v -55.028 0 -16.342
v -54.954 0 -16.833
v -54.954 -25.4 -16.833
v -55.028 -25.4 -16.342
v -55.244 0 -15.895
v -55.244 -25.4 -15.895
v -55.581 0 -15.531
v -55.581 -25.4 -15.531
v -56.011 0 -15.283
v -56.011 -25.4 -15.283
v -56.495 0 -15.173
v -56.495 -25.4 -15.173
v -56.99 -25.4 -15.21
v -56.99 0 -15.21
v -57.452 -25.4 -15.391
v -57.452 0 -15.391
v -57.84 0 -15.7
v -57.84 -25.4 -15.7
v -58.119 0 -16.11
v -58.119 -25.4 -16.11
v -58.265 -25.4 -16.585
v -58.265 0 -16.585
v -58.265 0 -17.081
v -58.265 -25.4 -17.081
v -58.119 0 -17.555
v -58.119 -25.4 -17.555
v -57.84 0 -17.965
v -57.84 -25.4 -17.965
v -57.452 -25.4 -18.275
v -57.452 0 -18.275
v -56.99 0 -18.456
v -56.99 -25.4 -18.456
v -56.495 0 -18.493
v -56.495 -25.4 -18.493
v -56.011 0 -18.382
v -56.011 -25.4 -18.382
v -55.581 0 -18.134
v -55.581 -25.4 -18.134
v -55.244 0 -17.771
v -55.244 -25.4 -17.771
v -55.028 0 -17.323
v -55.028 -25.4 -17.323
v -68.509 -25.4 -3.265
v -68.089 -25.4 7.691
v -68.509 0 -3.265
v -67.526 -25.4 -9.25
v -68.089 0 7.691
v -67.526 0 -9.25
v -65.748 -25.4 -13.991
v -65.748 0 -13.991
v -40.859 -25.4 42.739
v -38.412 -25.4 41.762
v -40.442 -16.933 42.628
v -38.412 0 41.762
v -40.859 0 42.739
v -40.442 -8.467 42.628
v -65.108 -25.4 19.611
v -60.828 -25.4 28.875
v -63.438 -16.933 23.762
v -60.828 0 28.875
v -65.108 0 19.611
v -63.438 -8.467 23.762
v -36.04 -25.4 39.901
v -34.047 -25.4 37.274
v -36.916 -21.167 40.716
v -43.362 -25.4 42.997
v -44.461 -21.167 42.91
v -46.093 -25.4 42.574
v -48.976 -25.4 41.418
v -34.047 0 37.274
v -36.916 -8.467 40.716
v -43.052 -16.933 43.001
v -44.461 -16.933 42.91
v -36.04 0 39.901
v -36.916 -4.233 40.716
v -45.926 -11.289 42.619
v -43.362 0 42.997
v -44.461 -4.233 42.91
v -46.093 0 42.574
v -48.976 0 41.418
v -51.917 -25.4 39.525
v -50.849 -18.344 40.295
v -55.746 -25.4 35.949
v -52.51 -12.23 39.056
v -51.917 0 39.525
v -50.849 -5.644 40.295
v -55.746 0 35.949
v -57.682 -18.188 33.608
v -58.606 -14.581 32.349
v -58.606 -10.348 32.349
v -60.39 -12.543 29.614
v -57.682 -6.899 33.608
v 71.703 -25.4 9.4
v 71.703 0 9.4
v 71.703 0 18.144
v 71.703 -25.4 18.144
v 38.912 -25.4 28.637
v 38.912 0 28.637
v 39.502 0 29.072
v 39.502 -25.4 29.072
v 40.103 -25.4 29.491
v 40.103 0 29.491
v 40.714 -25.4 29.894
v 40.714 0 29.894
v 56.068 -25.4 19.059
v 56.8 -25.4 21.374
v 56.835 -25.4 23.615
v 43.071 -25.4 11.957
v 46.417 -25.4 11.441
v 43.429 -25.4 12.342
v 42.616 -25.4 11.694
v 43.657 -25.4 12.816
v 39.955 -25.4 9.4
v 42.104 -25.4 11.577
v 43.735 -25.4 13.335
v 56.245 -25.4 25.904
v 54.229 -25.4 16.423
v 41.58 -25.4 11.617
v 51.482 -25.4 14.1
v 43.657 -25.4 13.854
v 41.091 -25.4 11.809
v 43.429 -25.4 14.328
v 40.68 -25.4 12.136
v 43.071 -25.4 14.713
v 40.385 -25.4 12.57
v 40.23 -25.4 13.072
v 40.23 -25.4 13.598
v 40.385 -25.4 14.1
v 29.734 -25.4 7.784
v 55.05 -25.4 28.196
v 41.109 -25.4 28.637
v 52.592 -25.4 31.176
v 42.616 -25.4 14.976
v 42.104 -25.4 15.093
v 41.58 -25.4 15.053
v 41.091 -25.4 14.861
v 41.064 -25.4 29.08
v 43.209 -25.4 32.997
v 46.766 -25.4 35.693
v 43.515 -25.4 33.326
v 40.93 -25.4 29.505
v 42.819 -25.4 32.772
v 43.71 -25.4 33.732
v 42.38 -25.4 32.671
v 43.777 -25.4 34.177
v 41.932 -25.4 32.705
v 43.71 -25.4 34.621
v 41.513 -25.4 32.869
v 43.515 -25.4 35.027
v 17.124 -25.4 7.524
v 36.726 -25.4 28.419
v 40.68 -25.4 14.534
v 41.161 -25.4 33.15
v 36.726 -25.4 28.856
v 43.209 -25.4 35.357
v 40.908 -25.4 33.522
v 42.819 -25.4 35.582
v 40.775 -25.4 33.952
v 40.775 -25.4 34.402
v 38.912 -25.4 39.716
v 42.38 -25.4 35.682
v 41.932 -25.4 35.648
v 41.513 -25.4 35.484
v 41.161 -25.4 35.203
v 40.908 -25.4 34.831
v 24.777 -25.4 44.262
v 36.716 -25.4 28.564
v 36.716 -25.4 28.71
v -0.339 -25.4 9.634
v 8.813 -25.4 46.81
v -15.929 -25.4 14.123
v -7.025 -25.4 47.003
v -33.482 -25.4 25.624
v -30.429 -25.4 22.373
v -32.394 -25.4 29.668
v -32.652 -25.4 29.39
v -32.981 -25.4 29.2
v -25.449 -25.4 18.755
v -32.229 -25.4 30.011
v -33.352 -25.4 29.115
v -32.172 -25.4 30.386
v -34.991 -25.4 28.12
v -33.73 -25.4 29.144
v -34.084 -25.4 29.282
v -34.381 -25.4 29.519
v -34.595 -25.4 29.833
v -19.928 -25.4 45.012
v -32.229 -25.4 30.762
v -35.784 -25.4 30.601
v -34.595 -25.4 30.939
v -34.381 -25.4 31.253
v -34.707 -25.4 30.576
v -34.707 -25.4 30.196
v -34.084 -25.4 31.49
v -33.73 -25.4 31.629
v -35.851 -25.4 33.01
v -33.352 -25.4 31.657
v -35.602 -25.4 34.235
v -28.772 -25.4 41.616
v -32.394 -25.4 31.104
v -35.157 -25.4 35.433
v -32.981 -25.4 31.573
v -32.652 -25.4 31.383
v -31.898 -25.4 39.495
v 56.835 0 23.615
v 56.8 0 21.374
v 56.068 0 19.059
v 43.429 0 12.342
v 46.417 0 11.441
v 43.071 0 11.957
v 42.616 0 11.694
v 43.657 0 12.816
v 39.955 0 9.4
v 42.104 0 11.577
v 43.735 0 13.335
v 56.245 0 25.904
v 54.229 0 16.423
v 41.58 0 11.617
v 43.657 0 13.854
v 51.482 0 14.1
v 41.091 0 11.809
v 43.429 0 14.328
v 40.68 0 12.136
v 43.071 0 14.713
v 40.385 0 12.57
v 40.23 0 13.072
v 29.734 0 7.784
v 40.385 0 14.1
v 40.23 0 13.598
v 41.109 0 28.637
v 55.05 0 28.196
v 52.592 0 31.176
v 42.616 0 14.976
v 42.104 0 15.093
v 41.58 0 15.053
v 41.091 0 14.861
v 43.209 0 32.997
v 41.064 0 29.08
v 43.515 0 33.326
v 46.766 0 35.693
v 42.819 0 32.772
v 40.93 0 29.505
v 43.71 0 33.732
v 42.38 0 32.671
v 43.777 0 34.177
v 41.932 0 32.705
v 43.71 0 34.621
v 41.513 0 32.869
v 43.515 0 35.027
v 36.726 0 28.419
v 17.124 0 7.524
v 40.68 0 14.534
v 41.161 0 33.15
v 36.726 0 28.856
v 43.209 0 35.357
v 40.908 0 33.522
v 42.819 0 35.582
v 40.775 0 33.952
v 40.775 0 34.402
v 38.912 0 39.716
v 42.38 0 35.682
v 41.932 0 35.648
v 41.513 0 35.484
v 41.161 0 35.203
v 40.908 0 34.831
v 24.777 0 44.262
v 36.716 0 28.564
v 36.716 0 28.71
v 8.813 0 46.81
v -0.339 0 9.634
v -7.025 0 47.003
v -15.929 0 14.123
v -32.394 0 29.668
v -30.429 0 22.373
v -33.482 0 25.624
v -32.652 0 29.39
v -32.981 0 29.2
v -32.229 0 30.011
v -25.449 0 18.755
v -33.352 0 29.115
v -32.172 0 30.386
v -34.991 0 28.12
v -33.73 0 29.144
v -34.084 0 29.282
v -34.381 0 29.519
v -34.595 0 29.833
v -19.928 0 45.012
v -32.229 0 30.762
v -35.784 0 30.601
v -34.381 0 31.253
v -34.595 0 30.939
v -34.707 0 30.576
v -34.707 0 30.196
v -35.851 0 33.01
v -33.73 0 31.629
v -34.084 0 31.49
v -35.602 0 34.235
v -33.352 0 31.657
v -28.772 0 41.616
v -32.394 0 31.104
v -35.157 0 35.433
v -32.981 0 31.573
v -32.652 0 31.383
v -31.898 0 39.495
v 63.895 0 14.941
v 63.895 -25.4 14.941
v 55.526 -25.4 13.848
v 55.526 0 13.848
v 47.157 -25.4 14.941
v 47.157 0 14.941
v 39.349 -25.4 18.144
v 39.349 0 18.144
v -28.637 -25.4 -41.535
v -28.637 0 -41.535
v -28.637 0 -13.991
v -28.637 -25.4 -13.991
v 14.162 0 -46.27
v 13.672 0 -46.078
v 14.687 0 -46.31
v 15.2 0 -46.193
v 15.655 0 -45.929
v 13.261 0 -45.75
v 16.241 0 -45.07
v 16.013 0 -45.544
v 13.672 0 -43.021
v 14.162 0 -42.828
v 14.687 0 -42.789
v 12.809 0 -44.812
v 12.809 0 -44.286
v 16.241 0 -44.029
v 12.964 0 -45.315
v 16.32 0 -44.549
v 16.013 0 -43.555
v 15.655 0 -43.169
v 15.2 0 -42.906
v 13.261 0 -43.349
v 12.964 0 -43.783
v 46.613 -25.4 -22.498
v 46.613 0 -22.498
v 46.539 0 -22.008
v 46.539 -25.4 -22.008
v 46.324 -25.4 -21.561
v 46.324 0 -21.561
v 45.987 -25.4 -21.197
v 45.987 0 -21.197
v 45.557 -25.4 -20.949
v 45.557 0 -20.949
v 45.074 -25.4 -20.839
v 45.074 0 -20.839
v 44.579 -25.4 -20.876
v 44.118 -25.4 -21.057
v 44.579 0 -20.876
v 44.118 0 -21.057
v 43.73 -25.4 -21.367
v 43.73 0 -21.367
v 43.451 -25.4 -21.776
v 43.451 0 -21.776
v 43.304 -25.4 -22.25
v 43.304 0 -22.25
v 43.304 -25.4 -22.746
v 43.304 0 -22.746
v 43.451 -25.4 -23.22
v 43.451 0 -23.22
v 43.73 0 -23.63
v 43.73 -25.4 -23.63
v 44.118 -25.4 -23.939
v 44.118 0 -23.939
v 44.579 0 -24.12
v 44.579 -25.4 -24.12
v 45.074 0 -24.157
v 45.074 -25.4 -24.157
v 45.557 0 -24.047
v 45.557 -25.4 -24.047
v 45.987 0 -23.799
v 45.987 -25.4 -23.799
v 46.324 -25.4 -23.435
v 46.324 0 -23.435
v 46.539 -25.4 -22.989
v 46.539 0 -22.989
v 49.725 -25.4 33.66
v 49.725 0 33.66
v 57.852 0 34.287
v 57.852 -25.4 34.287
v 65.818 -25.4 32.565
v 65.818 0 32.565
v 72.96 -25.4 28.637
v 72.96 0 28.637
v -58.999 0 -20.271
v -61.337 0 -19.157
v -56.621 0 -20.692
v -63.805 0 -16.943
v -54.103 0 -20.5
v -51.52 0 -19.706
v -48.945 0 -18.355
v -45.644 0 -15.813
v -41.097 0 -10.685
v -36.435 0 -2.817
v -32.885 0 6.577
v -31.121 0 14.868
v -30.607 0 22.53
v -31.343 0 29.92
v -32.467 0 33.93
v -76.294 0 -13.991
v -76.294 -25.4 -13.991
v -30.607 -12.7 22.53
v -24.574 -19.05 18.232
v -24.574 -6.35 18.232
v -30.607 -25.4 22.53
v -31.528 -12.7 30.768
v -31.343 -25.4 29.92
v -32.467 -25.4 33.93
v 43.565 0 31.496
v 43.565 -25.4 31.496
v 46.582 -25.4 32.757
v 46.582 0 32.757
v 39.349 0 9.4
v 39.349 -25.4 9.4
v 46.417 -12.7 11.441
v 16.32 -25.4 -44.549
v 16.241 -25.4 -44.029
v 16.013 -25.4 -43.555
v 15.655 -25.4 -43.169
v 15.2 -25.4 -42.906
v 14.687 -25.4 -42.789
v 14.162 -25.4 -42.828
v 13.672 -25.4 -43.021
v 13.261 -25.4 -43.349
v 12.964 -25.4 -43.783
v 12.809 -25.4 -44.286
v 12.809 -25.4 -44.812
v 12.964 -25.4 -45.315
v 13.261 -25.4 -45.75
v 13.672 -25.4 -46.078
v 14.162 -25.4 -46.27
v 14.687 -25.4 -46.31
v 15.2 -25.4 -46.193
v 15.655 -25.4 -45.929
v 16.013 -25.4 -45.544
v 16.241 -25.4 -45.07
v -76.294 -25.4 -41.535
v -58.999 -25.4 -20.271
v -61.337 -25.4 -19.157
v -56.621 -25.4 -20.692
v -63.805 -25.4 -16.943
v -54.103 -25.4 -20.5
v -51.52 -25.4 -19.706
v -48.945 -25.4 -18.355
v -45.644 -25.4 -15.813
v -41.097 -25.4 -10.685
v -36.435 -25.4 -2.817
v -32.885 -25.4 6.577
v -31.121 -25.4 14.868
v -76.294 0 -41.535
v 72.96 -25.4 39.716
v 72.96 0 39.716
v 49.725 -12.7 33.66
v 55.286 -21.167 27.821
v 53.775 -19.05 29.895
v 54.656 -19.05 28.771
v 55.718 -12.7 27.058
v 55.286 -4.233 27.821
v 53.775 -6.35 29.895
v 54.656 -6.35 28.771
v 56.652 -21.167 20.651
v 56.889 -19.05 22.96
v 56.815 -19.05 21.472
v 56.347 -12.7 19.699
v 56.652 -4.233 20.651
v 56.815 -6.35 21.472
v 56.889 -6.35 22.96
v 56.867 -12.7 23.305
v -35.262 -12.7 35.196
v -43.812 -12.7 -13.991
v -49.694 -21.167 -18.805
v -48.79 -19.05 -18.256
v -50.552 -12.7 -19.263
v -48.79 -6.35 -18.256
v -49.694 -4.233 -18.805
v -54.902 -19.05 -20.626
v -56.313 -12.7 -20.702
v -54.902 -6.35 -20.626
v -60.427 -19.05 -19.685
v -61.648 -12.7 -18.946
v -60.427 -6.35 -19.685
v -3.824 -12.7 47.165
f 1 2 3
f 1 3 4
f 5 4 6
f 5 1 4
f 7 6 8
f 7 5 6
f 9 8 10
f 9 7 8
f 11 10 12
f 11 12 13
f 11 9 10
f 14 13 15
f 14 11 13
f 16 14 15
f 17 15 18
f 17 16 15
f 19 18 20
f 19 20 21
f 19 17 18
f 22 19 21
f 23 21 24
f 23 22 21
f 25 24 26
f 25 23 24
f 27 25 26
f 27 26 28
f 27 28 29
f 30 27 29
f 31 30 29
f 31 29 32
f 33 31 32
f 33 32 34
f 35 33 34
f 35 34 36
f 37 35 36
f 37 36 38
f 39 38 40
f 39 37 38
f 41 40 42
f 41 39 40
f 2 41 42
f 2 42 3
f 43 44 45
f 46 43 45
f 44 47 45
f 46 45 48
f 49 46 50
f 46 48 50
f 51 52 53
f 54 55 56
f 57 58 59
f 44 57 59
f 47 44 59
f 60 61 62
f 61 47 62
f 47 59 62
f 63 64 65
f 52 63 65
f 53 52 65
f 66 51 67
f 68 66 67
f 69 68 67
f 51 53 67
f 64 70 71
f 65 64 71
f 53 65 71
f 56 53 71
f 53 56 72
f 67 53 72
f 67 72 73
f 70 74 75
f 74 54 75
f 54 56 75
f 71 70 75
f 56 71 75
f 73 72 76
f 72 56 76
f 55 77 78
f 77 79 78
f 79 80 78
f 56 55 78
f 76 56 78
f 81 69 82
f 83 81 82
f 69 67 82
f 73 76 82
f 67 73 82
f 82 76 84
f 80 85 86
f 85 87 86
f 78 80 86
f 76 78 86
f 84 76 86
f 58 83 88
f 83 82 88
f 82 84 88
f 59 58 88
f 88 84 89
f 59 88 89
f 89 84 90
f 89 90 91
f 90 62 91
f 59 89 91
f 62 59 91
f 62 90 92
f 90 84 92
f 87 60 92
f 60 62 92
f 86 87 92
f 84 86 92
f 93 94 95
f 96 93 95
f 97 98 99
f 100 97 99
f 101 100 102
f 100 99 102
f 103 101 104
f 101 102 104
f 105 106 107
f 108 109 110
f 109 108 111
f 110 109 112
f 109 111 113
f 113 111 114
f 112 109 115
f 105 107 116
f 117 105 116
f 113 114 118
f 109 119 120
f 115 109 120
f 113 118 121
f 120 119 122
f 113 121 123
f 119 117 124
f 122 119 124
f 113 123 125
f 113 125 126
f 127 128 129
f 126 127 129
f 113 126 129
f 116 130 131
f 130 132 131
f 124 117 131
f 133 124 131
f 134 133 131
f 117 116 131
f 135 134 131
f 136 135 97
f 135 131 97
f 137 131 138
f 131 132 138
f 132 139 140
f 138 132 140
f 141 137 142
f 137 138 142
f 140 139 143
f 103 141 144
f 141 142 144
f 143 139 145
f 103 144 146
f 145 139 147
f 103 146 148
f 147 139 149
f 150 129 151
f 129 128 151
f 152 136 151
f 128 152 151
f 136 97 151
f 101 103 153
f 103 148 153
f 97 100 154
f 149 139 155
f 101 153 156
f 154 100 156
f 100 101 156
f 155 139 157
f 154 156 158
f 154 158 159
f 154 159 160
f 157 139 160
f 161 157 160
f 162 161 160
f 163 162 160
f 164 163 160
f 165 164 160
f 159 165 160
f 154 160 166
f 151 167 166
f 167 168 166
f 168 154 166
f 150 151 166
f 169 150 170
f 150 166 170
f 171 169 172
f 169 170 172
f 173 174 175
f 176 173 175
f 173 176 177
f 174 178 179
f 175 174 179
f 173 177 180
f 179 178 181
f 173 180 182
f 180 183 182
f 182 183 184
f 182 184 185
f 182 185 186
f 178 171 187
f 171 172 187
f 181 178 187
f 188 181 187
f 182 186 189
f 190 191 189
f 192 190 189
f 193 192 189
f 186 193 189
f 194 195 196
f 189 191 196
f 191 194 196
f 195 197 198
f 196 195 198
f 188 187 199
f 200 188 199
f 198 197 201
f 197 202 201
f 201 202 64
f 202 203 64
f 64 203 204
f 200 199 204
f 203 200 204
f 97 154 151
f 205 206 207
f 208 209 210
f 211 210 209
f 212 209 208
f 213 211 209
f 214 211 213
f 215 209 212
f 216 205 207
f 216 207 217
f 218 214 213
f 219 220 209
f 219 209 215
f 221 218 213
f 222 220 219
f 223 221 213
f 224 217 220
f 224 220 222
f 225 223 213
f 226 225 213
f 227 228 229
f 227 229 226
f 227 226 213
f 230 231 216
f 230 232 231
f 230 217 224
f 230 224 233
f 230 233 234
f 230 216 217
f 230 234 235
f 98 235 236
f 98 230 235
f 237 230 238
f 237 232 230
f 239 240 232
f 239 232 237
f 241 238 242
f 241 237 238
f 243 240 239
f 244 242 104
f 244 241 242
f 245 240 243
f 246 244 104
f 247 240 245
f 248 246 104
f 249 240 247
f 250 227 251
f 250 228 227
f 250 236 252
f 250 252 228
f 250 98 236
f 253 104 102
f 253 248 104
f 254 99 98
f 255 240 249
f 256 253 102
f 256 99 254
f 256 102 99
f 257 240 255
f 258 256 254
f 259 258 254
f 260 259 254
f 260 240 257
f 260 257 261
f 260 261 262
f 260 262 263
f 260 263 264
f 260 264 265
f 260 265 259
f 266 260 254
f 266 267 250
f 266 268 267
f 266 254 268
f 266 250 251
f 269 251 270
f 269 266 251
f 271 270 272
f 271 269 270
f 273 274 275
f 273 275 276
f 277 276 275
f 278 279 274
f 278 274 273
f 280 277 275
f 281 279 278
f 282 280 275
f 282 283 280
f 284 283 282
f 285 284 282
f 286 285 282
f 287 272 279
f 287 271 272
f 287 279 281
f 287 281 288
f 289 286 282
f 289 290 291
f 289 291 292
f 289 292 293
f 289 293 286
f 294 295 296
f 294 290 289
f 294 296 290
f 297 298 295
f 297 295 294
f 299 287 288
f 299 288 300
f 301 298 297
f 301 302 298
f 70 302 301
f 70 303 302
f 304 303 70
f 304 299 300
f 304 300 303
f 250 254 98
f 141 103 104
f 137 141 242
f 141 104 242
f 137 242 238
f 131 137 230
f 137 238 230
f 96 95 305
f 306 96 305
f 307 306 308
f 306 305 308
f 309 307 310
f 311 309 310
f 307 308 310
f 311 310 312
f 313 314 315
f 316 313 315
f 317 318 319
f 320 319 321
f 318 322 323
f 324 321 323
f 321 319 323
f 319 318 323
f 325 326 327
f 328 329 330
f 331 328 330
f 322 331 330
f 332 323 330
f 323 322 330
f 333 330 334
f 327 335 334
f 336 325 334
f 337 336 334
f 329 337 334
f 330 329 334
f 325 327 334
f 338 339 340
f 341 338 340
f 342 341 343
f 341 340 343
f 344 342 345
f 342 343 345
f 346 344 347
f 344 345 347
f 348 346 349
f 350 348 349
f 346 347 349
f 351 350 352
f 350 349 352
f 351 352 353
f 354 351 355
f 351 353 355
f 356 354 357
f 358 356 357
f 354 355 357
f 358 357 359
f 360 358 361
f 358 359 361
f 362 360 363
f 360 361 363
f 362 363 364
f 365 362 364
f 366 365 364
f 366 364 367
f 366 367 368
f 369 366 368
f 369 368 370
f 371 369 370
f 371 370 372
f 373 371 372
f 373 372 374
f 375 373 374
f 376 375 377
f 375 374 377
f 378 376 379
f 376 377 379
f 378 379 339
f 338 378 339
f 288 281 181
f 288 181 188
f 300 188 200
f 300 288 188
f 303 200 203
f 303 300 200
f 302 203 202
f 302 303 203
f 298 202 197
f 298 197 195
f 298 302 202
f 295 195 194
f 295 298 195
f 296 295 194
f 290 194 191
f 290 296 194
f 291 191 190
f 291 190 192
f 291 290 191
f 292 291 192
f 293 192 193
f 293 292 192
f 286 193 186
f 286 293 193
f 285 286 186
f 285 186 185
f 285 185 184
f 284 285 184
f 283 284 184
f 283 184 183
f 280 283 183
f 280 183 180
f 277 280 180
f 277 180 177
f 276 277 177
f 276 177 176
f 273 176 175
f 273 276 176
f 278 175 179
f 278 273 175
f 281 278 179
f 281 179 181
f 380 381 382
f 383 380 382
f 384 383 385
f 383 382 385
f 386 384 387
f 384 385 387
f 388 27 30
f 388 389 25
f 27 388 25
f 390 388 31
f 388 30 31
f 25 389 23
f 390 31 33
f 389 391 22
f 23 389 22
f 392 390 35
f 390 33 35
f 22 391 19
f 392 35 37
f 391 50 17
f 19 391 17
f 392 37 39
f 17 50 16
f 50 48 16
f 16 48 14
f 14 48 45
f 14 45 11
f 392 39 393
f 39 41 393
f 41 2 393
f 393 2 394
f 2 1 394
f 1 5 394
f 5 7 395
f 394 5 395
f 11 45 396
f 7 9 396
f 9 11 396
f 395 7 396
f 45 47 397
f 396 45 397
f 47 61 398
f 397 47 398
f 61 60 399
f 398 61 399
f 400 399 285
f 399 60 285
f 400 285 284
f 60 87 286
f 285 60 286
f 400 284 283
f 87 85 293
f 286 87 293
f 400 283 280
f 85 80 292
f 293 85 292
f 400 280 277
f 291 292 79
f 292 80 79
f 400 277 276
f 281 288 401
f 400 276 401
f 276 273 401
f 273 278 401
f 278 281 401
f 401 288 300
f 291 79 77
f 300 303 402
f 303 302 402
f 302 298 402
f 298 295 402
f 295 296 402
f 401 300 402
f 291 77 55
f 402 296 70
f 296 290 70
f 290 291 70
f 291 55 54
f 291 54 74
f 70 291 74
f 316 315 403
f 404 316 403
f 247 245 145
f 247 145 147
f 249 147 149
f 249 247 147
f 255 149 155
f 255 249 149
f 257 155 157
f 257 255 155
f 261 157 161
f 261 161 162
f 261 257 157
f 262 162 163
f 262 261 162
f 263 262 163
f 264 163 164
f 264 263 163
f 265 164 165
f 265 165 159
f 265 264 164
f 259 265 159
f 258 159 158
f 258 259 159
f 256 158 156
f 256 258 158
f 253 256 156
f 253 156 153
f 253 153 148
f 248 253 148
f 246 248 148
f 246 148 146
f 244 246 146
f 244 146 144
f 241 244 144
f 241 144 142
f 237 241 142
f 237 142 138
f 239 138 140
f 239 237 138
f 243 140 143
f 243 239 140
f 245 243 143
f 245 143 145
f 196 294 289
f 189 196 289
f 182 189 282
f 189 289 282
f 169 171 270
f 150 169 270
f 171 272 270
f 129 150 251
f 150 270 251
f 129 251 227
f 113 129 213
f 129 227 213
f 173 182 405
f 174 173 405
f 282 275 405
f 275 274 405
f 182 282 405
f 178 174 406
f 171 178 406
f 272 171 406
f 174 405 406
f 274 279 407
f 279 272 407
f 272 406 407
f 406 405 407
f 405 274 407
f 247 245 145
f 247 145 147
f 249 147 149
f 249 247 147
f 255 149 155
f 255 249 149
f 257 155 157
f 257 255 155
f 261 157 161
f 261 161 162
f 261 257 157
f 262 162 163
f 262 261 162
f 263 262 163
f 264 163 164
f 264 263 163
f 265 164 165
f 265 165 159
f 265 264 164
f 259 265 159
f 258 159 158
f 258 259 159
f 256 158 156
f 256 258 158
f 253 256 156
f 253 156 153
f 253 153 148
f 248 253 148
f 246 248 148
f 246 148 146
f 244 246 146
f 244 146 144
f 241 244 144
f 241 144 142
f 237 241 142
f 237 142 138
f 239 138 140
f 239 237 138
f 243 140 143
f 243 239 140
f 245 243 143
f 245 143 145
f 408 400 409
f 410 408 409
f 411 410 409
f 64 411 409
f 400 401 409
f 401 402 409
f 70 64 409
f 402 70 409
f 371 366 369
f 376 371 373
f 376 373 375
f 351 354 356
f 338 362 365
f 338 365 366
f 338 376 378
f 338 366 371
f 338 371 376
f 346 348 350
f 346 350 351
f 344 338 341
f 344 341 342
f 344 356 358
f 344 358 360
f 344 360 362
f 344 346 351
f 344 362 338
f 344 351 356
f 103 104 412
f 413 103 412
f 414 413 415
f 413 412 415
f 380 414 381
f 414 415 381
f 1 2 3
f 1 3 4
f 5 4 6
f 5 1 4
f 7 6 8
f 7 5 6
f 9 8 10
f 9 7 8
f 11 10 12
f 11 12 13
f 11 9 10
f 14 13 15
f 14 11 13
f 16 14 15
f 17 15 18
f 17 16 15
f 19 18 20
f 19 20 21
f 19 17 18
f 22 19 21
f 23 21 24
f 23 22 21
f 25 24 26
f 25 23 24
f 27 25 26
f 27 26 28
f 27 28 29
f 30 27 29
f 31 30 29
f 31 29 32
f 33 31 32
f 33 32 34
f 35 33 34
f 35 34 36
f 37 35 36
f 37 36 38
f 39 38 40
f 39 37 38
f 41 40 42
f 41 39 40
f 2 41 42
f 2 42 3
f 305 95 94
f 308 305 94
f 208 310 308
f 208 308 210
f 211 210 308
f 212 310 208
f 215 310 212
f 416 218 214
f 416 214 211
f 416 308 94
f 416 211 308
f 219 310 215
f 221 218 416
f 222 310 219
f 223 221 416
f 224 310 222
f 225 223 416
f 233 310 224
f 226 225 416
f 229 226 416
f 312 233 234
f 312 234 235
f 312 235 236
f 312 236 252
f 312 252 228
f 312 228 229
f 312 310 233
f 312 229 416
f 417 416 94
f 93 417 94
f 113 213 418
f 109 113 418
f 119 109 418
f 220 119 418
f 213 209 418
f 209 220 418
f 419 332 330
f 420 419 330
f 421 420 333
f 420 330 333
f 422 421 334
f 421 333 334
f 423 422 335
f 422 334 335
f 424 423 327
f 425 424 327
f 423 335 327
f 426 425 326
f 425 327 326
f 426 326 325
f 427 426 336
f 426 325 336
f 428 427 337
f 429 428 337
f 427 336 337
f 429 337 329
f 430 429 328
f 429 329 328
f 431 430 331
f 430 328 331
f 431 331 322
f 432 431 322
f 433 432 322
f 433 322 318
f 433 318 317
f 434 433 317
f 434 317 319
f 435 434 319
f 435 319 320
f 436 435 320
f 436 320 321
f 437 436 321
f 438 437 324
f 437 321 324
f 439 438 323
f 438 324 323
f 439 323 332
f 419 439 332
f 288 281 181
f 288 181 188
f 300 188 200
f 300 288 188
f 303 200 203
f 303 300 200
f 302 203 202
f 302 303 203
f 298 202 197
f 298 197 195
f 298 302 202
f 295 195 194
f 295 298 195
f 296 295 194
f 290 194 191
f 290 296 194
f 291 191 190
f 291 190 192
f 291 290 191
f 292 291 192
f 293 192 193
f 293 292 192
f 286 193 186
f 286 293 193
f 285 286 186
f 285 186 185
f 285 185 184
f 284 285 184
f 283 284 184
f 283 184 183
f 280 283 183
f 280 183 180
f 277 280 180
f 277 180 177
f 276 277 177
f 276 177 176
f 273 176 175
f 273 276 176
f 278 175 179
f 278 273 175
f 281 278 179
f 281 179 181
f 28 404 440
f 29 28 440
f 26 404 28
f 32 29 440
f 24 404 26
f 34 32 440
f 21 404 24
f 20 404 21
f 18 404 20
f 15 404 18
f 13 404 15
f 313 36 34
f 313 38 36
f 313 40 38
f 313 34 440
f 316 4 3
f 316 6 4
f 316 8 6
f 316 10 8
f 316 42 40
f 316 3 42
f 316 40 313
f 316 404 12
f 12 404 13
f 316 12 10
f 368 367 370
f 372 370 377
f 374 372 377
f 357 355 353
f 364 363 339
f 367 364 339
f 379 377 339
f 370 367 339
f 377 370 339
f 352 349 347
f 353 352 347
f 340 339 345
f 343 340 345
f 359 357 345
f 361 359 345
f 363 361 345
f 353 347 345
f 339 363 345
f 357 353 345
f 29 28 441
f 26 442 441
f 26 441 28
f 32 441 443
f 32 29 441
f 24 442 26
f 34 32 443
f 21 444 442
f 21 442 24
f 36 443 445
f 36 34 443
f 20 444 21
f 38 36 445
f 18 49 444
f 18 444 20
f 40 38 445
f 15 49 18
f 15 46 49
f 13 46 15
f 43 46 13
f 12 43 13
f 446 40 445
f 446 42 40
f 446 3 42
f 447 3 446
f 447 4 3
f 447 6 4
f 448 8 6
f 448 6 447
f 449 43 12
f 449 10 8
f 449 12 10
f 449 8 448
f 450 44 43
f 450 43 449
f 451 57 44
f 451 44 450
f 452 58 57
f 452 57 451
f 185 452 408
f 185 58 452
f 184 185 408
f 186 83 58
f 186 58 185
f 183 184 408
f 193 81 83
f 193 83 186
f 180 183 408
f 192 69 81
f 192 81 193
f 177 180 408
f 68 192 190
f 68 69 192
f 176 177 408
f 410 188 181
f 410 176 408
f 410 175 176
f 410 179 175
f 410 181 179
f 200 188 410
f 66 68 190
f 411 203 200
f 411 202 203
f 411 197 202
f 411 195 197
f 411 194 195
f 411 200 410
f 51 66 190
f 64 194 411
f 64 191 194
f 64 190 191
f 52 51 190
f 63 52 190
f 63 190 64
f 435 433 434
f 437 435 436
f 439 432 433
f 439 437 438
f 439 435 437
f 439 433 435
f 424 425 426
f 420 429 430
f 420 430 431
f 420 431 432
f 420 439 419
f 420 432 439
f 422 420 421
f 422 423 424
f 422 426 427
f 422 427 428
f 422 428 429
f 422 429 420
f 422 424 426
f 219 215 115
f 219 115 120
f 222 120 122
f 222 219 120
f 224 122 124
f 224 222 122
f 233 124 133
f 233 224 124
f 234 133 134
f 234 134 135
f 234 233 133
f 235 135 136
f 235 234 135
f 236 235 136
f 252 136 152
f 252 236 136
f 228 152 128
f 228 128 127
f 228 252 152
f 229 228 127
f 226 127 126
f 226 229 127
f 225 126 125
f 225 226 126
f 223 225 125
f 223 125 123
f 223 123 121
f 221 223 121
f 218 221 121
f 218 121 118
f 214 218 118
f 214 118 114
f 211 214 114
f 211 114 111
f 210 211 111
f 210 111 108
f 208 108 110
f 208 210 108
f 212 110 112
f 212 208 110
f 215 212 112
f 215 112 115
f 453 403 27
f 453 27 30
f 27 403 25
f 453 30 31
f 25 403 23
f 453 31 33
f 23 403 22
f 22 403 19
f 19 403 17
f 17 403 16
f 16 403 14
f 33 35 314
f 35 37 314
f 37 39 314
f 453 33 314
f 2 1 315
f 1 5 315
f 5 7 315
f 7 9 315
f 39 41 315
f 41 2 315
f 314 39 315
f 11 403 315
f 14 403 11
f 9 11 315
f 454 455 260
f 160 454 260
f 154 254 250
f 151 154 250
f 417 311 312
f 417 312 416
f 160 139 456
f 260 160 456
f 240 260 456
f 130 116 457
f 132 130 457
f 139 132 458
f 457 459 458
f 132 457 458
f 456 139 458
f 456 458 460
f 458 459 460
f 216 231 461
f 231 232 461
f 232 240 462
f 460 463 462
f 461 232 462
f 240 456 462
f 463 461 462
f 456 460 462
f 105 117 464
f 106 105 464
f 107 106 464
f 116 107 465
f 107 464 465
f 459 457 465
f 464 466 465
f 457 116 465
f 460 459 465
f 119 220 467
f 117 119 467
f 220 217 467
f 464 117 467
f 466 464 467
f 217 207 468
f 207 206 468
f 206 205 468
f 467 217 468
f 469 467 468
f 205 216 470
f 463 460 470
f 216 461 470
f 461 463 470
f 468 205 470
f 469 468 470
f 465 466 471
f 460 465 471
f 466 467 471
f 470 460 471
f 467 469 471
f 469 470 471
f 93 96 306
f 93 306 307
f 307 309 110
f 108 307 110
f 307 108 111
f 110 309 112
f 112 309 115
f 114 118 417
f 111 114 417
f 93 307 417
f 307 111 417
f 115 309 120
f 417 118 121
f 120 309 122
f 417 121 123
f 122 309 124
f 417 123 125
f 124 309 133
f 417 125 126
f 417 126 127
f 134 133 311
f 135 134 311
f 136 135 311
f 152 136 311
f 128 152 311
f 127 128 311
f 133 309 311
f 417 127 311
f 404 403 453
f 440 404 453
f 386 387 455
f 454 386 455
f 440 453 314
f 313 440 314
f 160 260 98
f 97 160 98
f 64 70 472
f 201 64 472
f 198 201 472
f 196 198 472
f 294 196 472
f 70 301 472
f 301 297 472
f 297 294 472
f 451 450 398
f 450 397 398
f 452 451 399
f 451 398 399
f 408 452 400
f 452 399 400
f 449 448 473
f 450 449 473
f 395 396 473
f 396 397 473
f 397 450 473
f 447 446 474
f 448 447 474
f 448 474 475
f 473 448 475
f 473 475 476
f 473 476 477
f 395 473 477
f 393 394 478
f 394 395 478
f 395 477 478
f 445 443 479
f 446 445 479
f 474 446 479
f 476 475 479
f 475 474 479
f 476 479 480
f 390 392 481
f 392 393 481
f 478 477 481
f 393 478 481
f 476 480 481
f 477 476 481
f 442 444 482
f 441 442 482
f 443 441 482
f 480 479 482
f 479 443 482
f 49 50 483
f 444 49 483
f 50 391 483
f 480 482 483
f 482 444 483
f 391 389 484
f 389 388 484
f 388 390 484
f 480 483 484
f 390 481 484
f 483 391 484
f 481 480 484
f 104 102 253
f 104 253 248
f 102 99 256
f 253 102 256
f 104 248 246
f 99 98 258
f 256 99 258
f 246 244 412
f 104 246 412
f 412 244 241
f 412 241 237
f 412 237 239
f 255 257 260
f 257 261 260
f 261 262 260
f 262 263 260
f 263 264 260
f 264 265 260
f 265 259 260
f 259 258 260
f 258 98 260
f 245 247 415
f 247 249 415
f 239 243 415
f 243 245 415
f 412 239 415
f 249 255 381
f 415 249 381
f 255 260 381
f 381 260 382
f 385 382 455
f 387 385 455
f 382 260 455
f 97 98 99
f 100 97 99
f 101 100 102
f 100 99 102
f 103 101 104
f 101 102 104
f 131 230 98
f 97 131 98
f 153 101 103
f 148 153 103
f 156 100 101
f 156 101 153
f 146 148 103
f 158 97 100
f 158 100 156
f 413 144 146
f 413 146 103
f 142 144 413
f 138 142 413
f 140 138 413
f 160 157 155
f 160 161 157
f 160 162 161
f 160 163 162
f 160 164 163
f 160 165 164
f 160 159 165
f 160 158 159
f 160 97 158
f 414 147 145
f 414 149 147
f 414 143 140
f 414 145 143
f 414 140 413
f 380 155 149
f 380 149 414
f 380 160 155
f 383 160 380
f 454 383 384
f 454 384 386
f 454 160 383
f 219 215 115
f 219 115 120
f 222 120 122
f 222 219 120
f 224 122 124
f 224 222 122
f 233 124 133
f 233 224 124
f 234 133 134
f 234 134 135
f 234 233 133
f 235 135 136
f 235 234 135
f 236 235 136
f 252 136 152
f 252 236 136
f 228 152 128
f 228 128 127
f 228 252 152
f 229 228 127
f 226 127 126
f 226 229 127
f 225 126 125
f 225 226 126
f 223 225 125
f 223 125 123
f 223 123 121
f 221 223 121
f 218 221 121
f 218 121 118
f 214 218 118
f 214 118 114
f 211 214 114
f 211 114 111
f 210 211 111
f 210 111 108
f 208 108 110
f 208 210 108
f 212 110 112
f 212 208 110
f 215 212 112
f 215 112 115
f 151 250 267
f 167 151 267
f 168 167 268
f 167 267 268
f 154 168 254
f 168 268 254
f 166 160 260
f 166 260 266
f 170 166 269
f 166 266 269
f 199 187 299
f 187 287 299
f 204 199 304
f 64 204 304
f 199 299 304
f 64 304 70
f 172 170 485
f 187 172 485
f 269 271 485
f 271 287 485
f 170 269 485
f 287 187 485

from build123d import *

# Parameters (mm, degrees)
F0_R     = 1.6648574253
F1_DEPTH = 25.4
F0_R_2   = 1.2746846195
F2_DEPTH = 25.4
F0_R_3   = 1.5093262789
F0_R_4   = 1.7624624991
F3_DEPTH = 25.4
F4_DEPTH = 25.4
F5_DEPTH = 25.4
F0_R_5   = 1.6637
F6_DEPTH = 25.4
F0_R_6   = 1.7653
F7_DEPTH = 25.4


with BuildPart() as f1:
    # F0 (on Front) → F1 (new body)
    with BuildSketch(Plane.XZ):
        with BuildLine():
            Line((-65.74847113, -13.9908194542), (-76.2936919928, -13.9908194542))
            Line((-76.2936919928, -13.9908194542), (-76.2936919928, -41.5352471173))
            Line((-76.2936919928, -41.5352471173), (-28.6374595016, -41.5352471173))
            Line((-28.6374595016, -41.5352471173), (-28.6374595016, -13.9908194542))
            Line((-28.6374595016, -13.9908194542), (-43.8124972207, -13.9908194542))
            add(Edge.make_bspline(
                [(-65.74847113, -13.9908194542), (-57.901801116, -29.2074724294), (-43.8124972207, -13.9908194542)],
                knots=[2.6335293878, 2.6335293878, 2.6335293878, 3.9558914178, 3.9558914178, 3.9558914178], degree=2, weights=[1, 0.7892675805, 1]))
        make_face()
        with BuildLine():
            Line((-43.8124972207, -13.9908194542), (-65.74847113, -13.9908194542))
            add(Edge.make_bspline(
                [(-65.74847113, -13.9908194542), (-57.901801116, -29.2074724294), (-43.8124972207, -13.9908194542)],
                knots=[2.6335293878, 2.6335293878, 2.6335293878, 3.9558914178, 3.9558914178, 3.9558914178], degree=2, weights=[1, 0.7892675805, 1]))
        make_face()
        with Locations((-56.6191002727, -16.8327037245)):
            Circle(F0_R, mode=Mode.SUBTRACT)
    extrude(amount=F1_DEPTH)


with BuildPart() as f2:
    # F0 (on Front) → F2 (new body)
    with BuildSketch(Plane.XZ):
        with BuildLine():
            add(Edge.make_bspline(
                [(-40.4422134161, 42.6282808185), (-53.3260877862, 46.3860779386), (-63.4380078396, 23.7621158368), (-73.5499278931, 1.138153735), (-65.74847113, -13.9908194542)],
                knots=[0, 0, 0, 1.3167646939, 1.3167646939, 2.6335293878, 2.6335293878, 2.6335293878], degree=2, weights=[1, 0.7909830078, 1, 0.7909830078, 1]))
            Line((-65.74847113, -13.9908194542), (-43.8124972207, -13.9908194542))
            add(Edge.make_bspline(
                [(-43.8124972207, -13.9908194542), (-30.39911729, 0.4958258156), (-30.6065511, 22.5303112299)],
                knots=[3.9558914178, 3.9558914178, 3.9558914178, 5.2309042501, 5.2309042501, 5.2309042501], degree=2, weights=[1, 0.8035824195, 1]))
            add(Edge.make_bspline(
                [(-35.8514748514, 33.0095887184), (-36.4900093054, 27.8030752059), (-30.6065511, 22.5303112299)],
                knots=[0, 0, 0, 0.5332011637, 0.5332011637, 0.5332011637], degree=2, weights=[1, 0.9646720576, 1]))
            add(Edge.make_bspline(
                [(-34.0468191814, 37.2744625047), (-35.5767113809, 35.2499685643), (-35.8514748514, 33.0095887184)],
                knots=[6.0492252063, 6.0492252063, 6.0492252063, 6.2831853072, 6.2831853072, 6.2831853072], degree=2, weights=[1, 0.9931656329, 1]))
            add(Edge.make_bspline(
                [(-34.0468191814, 37.2744625047), (-36.5783538888, 41.5013216611), (-40.4422134161, 42.6282808185)],
                knots=[5.8272955283, 5.8272955283, 5.8272955283, 6.2831853072, 6.2831853072, 6.2831853072], degree=2, weights=[1, 0.9741328576, 1]))
        make_face()
        with BuildLine():
            Line((-43.8124972207, -13.9908194542), (-65.74847113, -13.9908194542))
            add(Edge.make_bspline(
                [(-65.74847113, -13.9908194542), (-57.901801116, -29.2074724294), (-43.8124972207, -13.9908194542)],
                knots=[2.6335293878, 2.6335293878, 2.6335293878, 3.9558914178, 3.9558914178, 3.9558914178], degree=2, weights=[1, 0.7892675805, 1]))
        make_face()
        with Locations((-56.6191002727, -16.8327037245)):
            Circle(F0_R, mode=Mode.SUBTRACT)
        with BuildLine():
            add(Edge.make_bspline(
                [(-35.8514748514, 33.0095887184), (-36.4900093054, 27.8030752059), (-30.6065511, 22.5303112299)],
                knots=[0, 0, 0, 0.5332011637, 0.5332011637, 0.5332011637], degree=2, weights=[1, 0.9646720576, 1]))
            add(Edge.make_bspline(
                [(-30.6065511, 22.5303112299), (-30.6926305757, 31.6740325446), (-34.0468191814, 37.2744625047)],
                knots=[5.2309042501, 5.2309042501, 5.2309042501, 5.8272955283, 5.8272955283, 5.8272955283], degree=2, weights=[1, 0.9558681588, 1]))
            add(Edge.make_bspline(
                [(-34.0468191814, 37.2744625047), (-35.5767113809, 35.2499685643), (-35.8514748514, 33.0095887184)],
                knots=[6.0492252063, 6.0492252063, 6.0492252063, 6.2831853072, 6.2831853072, 6.2831853072], degree=2, weights=[1, 0.9931656329, 1]))
        make_face()
        with Locations((-33.446803689, 30.3863119334)):
            Circle(F0_R_2, mode=Mode.SUBTRACT)
    extrude(amount=F2_DEPTH)


with BuildPart() as f3:
    # F0 (on Front) → F3 (new body)
    with BuildSketch(Plane.XZ):
        with BuildLine():
            add(Edge.make_bspline(
                [(-30.6065511, 22.5303112299), (-30.6926305757, 31.6740325446), (-34.0468191814, 37.2744625047)],
                knots=[5.2309042501, 5.2309042501, 5.2309042501, 5.8272955283, 5.8272955283, 5.8272955283], degree=2, weights=[1, 0.9558681588, 1]))
            add(Edge.make_bspline(
                [(-30.6065511, 22.5303112299), (-4.1211296506, -1.2059627831), (39.9547474934, 9.4000818208)],
                knots=[0.5332011637, 0.5332011637, 0.5332011637, 2.3090834654, 2.3090834654, 2.3090834654], degree=2, weights=[1, 0.631010565, 1]))
            Line((39.9547474934, 9.4000818208), (39.3491834402, 9.4000818208))
            Line((39.3491834402, 9.4000818208), (39.3491834402, 18.144344911))
            ThreePointArc((39.3491834402, 18.144344911), (45.2153013253, 15.521543233), (51.4818777029, 14.1001185296))
            add(Edge.make_bspline(
                [(51.4818777029, 14.1001185296), (64.1008126468, 22.7205977391), (49.725035443, 33.6600844937)],
                knots=[2.7040829127, 2.7040829127, 2.7040829127, 3.7553867766, 3.7553867766, 3.7553867766], degree=2, weights=[1, 0.864997001, 1]))
            ThreePointArc((49.725035443, 33.6600844937), (45.0554420673, 32.1698025197), (40.7142353585, 29.893848441))
            ThreePointArc((40.7142353585, 29.893848441), (41.0079415351, 29.2959243941), (41.1089389077, 28.6374595016))
            Line((41.1089389077, 28.6374595016), (38.9119684696, 28.6374595016))
            Line((38.9119684696, 28.6374595016), (38.9119684696, 39.715750342))
            add(Edge.make_bspline(
                [(38.9119684696, 39.715750342), (-14.936500743, 62.5629919113), (-34.0468191814, 37.2744625047)],
                knots=[4.1036670243, 4.1036670243, 4.1036670243, 6.0492252063, 6.0492252063, 6.0492252063], degree=2, weights=[1, 0.5630049186, 1]))
        make_face()
        with BuildLine():
            ThreePointArc((36.7259010673, 28.418853879), (36.7149980315, 28.6374595016), (36.7259010673, 28.8560651243))
            Line((36.7259010673, 28.8560651243), (36.7259010673, 28.418853879))
        make_face(mode=Mode.SUBTRACT)
        with BuildLine():
            add(Edge.make_bspline(
                [(-35.8514748514, 33.0095887184), (-36.4900093054, 27.8030752059), (-30.6065511, 22.5303112299)],
                knots=[0, 0, 0, 0.5332011637, 0.5332011637, 0.5332011637], degree=2, weights=[1, 0.9646720576, 1]))
            add(Edge.make_bspline(
                [(-30.6065511, 22.5303112299), (-30.6926305757, 31.6740325446), (-34.0468191814, 37.2744625047)],
                knots=[5.2309042501, 5.2309042501, 5.2309042501, 5.8272955283, 5.8272955283, 5.8272955283], degree=2, weights=[1, 0.9558681588, 1]))
            add(Edge.make_bspline(
                [(-34.0468191814, 37.2744625047), (-35.5767113809, 35.2499685643), (-35.8514748514, 33.0095887184)],
                knots=[6.0492252063, 6.0492252063, 6.0492252063, 6.2831853072, 6.2831853072, 6.2831853072], degree=2, weights=[1, 0.9931656329, 1]))
        make_face()
        with Locations((-33.446803689, 30.3863119334)):
            Circle(F0_R_2, mode=Mode.SUBTRACT)
        with BuildLine():
            add(Edge.make_bspline(
                [(49.725035443, 33.6600844937), (45.3653485598, 36.9776607358), (38.9119684696, 39.715750342)],
                knots=[3.7553867766, 3.7553867766, 3.7553867766, 4.1036670243, 4.1036670243, 4.1036670243], degree=2, weights=[1, 0.9848758863, 1]))
            Line((38.9119684696, 39.715750342), (38.9119684696, 28.6374595016))
            ThreePointArc((38.9119684696, 28.6374595016), (39.8008685688, 29.2832024807), (40.7142353585, 29.893848441))
            ThreePointArc((40.7142353585, 29.893848441), (45.0554420673, 32.1698025197), (49.725035443, 33.6600844937))
        make_face()
        with Locations((42.2675684094, 34.1766049218)):
            Circle(F0_R_3, mode=Mode.SUBTRACT)
        with BuildLine():
            Line((39.3491834402, 9.4000818208), (39.9547474934, 9.4000818208))
            add(Edge.make_bspline(
                [(39.9547474934, 9.4000818208), (47.1288473098, 11.1263962489), (51.4818777029, 14.1001185296)],
                knots=[2.3090834654, 2.3090834654, 2.3090834654, 2.7040829127, 2.7040829127, 2.7040829127], degree=2, weights=[1, 0.9805602422, 1]))
            ThreePointArc((51.4818777029, 14.1001185296), (45.2153013253, 15.521543233), (39.3491834402, 18.144344911))
            Line((39.3491834402, 18.144344911), (39.3491834402, 9.4000818208))
        make_face()
        with Locations((41.9724583626, 13.3350007236)):
            Circle(F0_R_4, mode=Mode.SUBTRACT)
    extrude(amount=F3_DEPTH)


with BuildPart() as f4:
    # F0 (on Front) → F4 (new body)
    with BuildSketch(Plane.XZ):
        with BuildLine():
            add(Edge.make_bspline(
                [(39.9547474934, 9.4000818208), (47.1288473098, 11.1263962489), (51.4818777029, 14.1001185296)],
                knots=[2.3090834654, 2.3090834654, 2.3090834654, 2.7040829127, 2.7040829127, 2.7040829127], degree=2, weights=[1, 0.9805602422, 1]))
            Line((39.9547474934, 9.4000818208), (71.7029497027, 9.4000818208))
            Line((71.7029497027, 9.4000818208), (71.7029497027, 18.144344911))
            ThreePointArc((71.7029497027, 18.144344911), (61.9205571121, 14.4815195348), (51.4818777029, 14.1001185296))
        make_face()
        with BuildLine():
            Line((39.3491834402, 9.4000818208), (39.9547474934, 9.4000818208))
            add(Edge.make_bspline(
                [(39.9547474934, 9.4000818208), (47.1288473098, 11.1263962489), (51.4818777029, 14.1001185296)],
                knots=[2.3090834654, 2.3090834654, 2.3090834654, 2.7040829127, 2.7040829127, 2.7040829127], degree=2, weights=[1, 0.9805602422, 1]))
            ThreePointArc((51.4818777029, 14.1001185296), (45.2153013253, 15.521543233), (39.3491834402, 18.144344911))
            Line((39.3491834402, 18.144344911), (39.3491834402, 9.4000818208))
        make_face()
        with Locations((41.9724583626, 13.3350007236)):
            Circle(F0_R_4, mode=Mode.SUBTRACT)
    extrude(amount=F4_DEPTH)


with BuildPart() as f5:
    # F0 (on Front) → F5 (new body)
    with BuildSketch(Plane.XZ):
        with BuildLine():
            Line((72.9604139924, 39.715750342), (38.9119684696, 39.715750342))
            add(Edge.make_bspline(
                [(49.725035443, 33.6600844937), (45.3653485598, 36.9776607358), (38.9119684696, 39.715750342)],
                knots=[3.7553867766, 3.7553867766, 3.7553867766, 4.1036670243, 4.1036670243, 4.1036670243], degree=2, weights=[1, 0.9848758863, 1]))
            ThreePointArc((49.725035443, 33.6600844937), (61.8975077631, 33.7152773793), (72.9604139924, 28.6374595016))
            Line((72.9604139924, 28.6374595016), (72.9604139924, 39.715750342))
        make_face()
        with BuildLine():
            add(Edge.make_bspline(
                [(49.725035443, 33.6600844937), (45.3653485598, 36.9776607358), (38.9119684696, 39.715750342)],
                knots=[3.7553867766, 3.7553867766, 3.7553867766, 4.1036670243, 4.1036670243, 4.1036670243], degree=2, weights=[1, 0.9848758863, 1]))
            Line((38.9119684696, 39.715750342), (38.9119684696, 28.6374595016))
            ThreePointArc((38.9119684696, 28.6374595016), (39.8008685688, 29.2832024807), (40.7142353585, 29.893848441))
            ThreePointArc((40.7142353585, 29.893848441), (45.0554420673, 32.1698025197), (49.725035443, 33.6600844937))
        make_face()
        with Locations((42.2675684094, 34.1766049218)):
            Circle(F0_R_3, mode=Mode.SUBTRACT)
    extrude(amount=F5_DEPTH)


with BuildPart() as f6:
    # F0 (on Front) → F6 (new body)
    with BuildSketch(Plane.XZ):
        with Locations((44.9494682252, -22.4981550127)):
            Circle(F0_R_5)
    extrude(amount=F6_DEPTH)


with BuildPart() as f7:
    # F0 (on Front) → F7 (new body)
    with BuildSketch(Plane.XZ):
        with Locations((14.5546058193, -44.549331069)):
            Circle(F0_R_6)
    extrude(amount=F7_DEPTH)


solid = Compound([f1.part, f2.part, f3.part, f4.part, f5.part, f6.part, f7.part])
